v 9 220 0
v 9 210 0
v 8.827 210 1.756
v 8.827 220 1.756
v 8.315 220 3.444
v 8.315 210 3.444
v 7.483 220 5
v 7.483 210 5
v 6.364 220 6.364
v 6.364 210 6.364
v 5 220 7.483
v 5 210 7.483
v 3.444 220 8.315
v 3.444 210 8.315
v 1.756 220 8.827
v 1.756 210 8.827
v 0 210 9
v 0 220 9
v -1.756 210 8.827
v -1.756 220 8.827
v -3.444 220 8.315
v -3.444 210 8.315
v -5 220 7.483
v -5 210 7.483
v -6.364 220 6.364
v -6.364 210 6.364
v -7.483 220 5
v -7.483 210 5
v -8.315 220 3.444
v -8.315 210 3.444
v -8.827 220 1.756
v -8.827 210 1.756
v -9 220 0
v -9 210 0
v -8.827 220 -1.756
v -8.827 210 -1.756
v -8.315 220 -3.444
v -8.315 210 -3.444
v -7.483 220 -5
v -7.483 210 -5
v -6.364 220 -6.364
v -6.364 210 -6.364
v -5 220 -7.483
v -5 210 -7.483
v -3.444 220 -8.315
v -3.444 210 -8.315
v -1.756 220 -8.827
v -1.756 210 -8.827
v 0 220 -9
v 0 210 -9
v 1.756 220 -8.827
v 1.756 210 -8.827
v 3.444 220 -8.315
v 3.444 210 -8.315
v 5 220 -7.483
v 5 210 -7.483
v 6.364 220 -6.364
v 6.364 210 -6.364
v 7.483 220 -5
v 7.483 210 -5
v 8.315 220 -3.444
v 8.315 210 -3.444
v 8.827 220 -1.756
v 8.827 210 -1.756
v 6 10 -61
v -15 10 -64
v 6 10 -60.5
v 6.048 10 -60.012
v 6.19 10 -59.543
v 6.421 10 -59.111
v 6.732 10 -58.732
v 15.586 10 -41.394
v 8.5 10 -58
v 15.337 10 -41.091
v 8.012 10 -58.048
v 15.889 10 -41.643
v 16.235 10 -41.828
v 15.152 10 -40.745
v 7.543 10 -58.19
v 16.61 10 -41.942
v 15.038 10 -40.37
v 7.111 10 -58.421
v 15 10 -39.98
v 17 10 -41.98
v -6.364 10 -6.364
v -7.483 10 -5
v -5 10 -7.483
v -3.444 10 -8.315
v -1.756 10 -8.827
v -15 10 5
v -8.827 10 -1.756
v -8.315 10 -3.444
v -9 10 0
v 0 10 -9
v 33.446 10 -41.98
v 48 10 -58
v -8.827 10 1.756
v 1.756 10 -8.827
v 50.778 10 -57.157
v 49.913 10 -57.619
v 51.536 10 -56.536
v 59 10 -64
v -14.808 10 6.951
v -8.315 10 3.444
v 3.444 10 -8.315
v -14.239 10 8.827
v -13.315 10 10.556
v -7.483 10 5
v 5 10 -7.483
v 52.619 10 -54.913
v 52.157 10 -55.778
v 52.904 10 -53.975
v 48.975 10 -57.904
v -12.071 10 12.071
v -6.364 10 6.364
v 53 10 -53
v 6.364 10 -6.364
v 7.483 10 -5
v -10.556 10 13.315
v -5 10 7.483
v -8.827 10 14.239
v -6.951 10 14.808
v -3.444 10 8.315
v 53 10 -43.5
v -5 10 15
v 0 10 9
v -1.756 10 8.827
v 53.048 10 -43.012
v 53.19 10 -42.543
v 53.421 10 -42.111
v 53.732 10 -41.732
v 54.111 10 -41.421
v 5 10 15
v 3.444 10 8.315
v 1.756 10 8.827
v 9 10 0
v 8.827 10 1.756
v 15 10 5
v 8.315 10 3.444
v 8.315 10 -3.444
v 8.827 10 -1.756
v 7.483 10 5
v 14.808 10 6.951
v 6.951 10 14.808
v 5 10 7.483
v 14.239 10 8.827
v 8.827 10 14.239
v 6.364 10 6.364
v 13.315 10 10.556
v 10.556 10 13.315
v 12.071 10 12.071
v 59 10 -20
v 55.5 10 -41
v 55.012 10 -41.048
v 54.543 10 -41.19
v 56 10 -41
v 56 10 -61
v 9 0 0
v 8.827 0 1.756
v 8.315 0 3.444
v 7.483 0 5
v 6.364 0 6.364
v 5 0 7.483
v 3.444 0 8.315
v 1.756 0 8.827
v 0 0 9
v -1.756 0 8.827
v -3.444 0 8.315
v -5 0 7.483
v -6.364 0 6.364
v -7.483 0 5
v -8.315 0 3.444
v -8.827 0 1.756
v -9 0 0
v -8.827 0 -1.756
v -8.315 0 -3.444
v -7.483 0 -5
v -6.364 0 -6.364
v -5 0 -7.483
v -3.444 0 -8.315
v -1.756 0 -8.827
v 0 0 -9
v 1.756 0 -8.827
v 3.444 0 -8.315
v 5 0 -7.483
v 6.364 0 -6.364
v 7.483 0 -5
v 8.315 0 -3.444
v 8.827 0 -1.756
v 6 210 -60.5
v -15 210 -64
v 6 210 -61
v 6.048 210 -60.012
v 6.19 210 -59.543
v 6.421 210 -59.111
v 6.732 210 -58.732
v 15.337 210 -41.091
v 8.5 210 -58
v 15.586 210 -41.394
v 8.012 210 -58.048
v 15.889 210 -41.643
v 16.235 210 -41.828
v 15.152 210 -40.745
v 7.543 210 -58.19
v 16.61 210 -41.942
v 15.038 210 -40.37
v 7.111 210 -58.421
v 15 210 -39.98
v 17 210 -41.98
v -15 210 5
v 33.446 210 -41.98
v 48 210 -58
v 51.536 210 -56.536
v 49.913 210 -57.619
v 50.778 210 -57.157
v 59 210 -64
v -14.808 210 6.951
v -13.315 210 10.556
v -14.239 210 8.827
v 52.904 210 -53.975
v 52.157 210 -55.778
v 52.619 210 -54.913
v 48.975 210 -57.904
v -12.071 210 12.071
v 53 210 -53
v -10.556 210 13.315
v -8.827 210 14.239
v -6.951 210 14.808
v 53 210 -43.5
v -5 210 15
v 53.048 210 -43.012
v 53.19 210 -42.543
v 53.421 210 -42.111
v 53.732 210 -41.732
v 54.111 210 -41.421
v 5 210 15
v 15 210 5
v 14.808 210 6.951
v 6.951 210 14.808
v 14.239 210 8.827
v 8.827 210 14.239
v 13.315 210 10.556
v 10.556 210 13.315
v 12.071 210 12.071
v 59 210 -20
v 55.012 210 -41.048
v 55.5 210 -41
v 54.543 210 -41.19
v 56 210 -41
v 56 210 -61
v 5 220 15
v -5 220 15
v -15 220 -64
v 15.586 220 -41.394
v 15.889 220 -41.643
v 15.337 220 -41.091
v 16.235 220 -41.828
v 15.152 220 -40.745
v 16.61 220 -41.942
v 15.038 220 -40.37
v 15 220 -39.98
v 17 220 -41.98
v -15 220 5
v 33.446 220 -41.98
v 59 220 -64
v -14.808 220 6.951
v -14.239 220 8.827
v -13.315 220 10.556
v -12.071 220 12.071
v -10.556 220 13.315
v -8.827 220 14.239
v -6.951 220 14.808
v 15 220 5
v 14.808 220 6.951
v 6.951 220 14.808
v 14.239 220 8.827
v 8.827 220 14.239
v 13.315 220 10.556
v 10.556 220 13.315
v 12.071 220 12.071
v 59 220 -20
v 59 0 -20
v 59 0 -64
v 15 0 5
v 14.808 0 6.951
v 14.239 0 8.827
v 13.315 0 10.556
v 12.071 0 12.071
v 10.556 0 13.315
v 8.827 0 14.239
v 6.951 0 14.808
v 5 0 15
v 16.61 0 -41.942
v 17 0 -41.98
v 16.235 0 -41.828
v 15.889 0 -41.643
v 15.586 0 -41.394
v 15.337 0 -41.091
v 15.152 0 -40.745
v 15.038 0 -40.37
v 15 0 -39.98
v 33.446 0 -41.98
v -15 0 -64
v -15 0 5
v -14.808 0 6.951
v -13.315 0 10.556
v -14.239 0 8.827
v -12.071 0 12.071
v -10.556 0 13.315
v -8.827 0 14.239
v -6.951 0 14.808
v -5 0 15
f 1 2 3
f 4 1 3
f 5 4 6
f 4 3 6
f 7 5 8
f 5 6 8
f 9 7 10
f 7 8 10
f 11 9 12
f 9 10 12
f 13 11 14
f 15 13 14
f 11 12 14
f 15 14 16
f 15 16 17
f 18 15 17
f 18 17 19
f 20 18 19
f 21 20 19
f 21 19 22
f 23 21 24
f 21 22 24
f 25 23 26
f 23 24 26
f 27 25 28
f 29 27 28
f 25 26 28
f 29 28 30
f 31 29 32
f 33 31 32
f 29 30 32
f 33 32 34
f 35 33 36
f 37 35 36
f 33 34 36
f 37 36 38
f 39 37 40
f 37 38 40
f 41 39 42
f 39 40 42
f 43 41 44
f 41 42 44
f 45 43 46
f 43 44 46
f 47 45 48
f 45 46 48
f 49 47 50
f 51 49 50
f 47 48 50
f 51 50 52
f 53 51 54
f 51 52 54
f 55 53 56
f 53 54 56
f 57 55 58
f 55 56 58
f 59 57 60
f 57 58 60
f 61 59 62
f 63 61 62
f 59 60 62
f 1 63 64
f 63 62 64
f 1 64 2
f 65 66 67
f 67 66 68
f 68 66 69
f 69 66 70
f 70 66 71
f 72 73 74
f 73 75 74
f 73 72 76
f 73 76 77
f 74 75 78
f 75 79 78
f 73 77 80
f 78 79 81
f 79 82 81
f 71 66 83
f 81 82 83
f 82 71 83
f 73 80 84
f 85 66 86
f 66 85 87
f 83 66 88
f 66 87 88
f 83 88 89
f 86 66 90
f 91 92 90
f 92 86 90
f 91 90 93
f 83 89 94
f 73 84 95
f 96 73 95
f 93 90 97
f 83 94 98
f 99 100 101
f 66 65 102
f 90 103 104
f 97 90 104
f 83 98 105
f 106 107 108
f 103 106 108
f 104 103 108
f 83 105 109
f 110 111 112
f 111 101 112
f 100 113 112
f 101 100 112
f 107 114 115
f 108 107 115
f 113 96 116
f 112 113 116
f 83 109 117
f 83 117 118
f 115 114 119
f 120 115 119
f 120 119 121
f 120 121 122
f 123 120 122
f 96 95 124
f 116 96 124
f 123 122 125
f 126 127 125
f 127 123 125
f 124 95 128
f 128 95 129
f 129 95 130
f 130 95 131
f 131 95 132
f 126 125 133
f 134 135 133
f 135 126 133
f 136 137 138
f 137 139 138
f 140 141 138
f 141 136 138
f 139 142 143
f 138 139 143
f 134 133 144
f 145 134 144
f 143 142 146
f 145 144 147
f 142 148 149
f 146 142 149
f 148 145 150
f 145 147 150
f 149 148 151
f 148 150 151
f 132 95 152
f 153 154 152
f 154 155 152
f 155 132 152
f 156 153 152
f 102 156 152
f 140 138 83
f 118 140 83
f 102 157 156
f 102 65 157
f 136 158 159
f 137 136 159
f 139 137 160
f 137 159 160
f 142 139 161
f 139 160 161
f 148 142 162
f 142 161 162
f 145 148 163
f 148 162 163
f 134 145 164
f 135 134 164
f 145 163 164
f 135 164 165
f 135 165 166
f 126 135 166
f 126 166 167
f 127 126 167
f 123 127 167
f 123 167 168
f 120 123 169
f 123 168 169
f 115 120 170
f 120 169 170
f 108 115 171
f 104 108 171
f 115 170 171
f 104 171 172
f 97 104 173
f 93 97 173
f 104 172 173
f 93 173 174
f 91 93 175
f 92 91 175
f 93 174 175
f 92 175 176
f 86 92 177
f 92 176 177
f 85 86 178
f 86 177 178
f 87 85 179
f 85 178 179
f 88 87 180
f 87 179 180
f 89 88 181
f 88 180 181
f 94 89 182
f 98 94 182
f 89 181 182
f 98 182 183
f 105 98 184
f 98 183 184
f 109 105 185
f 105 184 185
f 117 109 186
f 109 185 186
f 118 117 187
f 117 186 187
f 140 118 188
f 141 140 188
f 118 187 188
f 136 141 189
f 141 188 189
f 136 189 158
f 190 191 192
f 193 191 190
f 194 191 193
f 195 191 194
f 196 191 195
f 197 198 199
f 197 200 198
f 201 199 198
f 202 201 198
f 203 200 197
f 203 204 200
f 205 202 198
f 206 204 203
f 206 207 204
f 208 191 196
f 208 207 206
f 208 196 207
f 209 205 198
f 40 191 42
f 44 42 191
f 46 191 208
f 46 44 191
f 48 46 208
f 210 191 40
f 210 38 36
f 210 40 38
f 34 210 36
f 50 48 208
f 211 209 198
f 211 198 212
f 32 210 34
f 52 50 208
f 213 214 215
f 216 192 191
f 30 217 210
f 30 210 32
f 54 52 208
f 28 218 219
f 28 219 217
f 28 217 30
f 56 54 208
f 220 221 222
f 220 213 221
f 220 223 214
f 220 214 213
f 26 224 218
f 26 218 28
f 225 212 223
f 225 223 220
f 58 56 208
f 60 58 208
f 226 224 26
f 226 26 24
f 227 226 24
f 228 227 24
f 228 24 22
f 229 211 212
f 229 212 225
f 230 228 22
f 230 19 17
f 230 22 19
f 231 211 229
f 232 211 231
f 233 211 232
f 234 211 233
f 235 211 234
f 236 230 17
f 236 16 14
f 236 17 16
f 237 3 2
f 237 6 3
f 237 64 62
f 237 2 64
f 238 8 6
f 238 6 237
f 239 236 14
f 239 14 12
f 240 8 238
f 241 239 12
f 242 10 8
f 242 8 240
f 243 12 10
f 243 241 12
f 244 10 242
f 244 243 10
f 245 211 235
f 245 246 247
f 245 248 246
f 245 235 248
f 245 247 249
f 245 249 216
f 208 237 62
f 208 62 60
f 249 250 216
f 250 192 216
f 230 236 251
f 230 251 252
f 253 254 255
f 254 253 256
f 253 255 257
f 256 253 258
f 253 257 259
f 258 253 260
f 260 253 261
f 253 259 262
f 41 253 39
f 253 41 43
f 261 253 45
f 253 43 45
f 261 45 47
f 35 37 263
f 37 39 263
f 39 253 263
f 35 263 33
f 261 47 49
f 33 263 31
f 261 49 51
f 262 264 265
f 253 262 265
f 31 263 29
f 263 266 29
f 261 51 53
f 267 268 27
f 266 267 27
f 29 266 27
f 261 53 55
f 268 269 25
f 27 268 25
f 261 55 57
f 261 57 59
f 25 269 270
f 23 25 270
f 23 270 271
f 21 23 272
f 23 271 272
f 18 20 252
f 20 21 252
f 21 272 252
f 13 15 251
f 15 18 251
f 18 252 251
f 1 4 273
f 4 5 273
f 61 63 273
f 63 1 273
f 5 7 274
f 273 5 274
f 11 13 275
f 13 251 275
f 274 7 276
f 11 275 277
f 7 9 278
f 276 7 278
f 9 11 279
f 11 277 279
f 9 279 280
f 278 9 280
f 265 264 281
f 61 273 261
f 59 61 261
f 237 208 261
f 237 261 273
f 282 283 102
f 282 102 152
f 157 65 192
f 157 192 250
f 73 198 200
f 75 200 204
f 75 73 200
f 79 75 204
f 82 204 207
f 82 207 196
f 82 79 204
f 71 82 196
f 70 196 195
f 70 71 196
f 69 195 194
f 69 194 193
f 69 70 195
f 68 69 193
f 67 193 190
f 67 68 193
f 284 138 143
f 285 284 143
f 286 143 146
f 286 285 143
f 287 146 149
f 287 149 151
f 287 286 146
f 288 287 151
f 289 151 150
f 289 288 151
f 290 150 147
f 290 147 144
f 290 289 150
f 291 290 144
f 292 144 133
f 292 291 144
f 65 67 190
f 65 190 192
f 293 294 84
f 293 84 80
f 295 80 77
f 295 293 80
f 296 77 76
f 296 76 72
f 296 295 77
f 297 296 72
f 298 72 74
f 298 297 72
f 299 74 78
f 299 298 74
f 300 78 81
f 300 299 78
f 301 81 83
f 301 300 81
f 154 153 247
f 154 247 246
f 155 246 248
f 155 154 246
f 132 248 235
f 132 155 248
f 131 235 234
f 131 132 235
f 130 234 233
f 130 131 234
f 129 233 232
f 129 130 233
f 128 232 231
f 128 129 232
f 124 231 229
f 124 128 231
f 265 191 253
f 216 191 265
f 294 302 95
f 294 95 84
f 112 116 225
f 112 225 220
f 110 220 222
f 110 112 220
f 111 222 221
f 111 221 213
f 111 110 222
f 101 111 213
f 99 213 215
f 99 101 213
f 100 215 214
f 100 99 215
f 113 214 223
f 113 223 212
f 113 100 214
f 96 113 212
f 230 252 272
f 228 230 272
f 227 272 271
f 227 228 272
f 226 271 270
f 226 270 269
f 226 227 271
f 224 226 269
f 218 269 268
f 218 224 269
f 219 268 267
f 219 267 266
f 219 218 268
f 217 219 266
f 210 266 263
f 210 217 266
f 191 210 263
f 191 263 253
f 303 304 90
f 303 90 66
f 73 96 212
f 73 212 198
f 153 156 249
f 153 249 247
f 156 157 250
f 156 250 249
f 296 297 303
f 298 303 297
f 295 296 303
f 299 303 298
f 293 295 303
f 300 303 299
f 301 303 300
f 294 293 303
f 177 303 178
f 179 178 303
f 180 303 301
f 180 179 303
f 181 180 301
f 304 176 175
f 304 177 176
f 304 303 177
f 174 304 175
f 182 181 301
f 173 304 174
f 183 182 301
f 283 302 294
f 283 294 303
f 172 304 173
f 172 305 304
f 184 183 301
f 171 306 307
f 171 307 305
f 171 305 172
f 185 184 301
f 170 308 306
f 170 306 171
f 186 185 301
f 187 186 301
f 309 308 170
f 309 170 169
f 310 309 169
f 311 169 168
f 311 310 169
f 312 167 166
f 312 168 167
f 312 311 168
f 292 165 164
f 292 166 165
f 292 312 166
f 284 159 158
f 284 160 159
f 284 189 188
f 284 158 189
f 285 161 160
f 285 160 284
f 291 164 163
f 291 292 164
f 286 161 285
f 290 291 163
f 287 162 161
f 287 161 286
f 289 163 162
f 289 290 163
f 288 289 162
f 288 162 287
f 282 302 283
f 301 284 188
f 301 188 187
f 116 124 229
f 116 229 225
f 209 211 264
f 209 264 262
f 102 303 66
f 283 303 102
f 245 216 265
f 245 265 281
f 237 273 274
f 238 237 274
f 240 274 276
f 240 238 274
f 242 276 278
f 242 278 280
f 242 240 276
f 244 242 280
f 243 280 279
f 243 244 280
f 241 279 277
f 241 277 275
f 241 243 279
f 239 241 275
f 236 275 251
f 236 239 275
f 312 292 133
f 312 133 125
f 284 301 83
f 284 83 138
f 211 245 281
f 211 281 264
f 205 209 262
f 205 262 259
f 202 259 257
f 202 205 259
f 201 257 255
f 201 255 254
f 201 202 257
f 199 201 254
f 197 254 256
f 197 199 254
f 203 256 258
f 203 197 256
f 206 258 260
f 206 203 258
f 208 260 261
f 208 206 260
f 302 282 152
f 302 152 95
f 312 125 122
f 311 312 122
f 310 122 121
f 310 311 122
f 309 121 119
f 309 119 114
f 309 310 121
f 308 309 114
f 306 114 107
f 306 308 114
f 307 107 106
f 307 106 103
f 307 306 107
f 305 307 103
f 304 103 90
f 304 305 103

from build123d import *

# Parameters (mm, degrees)
F0_R     = 9
F1_DEPTH = 10
F4_DEPTH = 200
F6_R     = 9
F7_DEPTH = 10


with BuildPart() as f1:
    # F0 (on Front) → F1 (new body)
    with BuildSketch(Plane.XZ):
        with BuildLine():
            ThreePointArc((-5, 15), (-12.071068, 12.071068), (-15, 5))
            Line((-15, 5), (-15, -64))
            Line((-15, -64), (59, -64))
            Line((59, -64), (59, -20))
            Line((59, -20), (33.445753, -41.98012))
            Line((33.445753, -41.98012), (17, -41.98012))
            ThreePointArc((17, -41.98012), (15.585786, -41.394334), (15, -39.98012))
            Line((15, -39.98012), (15, 5))
            ThreePointArc((15, 5), (12.071068, 12.071068), (5, 15))
            Line((5, 15), (-5, 15))
        make_face()
        Circle(F0_R, mode=Mode.SUBTRACT)
    extrude(amount=-F1_DEPTH)

    # F3 (on offset) → F4 (join)
    with BuildSketch(Plane.XZ.offset(-10)):
        with BuildLine():
            Line((6, -60.5), (6, -61))
            Line((6, -61), (56, -61))
            Line((56, -61), (56, -41))
            Line((56, -41), (55.5, -41))
            ThreePointArc((55.5, -41), (53.732233, -41.732233), (53, -43.5))
            Line((53, -43.5), (53, -53))
            ThreePointArc((53, -53), (51.535534, -56.535534), (48, -58))
            Line((48, -58), (8.5, -58))
            ThreePointArc((8.5, -58), (6.732233, -58.732233), (6, -60.5))
        make_face()
    extrude(amount=-F4_DEPTH)

    # F6 (on offset) → F7 (join)
    with BuildSketch(Plane.XZ.offset(-210)):
        with BuildLine():
            ThreePointArc((-5, 15), (-12.071068, 12.071068), (-15, 5))
            Line((-15, 5), (-15, -64))
            Line((-15, -64), (59, -64))
            Line((59, -64), (59, -20))
            Line((59, -20), (33.445753, -41.98012))
            Line((33.445753, -41.98012), (17, -41.98012))
            ThreePointArc((17, -41.98012), (15.585786, -41.394334), (15, -39.98012))
            Line((15, -39.98012), (15, 5))
            ThreePointArc((15, 5), (12.071068, 12.071068), (5, 15))
            Line((5, 15), (-5, 15))
        make_face()
        Circle(F6_R, mode=Mode.SUBTRACT)
    extrude(amount=-F7_DEPTH)


solid = f1.part
